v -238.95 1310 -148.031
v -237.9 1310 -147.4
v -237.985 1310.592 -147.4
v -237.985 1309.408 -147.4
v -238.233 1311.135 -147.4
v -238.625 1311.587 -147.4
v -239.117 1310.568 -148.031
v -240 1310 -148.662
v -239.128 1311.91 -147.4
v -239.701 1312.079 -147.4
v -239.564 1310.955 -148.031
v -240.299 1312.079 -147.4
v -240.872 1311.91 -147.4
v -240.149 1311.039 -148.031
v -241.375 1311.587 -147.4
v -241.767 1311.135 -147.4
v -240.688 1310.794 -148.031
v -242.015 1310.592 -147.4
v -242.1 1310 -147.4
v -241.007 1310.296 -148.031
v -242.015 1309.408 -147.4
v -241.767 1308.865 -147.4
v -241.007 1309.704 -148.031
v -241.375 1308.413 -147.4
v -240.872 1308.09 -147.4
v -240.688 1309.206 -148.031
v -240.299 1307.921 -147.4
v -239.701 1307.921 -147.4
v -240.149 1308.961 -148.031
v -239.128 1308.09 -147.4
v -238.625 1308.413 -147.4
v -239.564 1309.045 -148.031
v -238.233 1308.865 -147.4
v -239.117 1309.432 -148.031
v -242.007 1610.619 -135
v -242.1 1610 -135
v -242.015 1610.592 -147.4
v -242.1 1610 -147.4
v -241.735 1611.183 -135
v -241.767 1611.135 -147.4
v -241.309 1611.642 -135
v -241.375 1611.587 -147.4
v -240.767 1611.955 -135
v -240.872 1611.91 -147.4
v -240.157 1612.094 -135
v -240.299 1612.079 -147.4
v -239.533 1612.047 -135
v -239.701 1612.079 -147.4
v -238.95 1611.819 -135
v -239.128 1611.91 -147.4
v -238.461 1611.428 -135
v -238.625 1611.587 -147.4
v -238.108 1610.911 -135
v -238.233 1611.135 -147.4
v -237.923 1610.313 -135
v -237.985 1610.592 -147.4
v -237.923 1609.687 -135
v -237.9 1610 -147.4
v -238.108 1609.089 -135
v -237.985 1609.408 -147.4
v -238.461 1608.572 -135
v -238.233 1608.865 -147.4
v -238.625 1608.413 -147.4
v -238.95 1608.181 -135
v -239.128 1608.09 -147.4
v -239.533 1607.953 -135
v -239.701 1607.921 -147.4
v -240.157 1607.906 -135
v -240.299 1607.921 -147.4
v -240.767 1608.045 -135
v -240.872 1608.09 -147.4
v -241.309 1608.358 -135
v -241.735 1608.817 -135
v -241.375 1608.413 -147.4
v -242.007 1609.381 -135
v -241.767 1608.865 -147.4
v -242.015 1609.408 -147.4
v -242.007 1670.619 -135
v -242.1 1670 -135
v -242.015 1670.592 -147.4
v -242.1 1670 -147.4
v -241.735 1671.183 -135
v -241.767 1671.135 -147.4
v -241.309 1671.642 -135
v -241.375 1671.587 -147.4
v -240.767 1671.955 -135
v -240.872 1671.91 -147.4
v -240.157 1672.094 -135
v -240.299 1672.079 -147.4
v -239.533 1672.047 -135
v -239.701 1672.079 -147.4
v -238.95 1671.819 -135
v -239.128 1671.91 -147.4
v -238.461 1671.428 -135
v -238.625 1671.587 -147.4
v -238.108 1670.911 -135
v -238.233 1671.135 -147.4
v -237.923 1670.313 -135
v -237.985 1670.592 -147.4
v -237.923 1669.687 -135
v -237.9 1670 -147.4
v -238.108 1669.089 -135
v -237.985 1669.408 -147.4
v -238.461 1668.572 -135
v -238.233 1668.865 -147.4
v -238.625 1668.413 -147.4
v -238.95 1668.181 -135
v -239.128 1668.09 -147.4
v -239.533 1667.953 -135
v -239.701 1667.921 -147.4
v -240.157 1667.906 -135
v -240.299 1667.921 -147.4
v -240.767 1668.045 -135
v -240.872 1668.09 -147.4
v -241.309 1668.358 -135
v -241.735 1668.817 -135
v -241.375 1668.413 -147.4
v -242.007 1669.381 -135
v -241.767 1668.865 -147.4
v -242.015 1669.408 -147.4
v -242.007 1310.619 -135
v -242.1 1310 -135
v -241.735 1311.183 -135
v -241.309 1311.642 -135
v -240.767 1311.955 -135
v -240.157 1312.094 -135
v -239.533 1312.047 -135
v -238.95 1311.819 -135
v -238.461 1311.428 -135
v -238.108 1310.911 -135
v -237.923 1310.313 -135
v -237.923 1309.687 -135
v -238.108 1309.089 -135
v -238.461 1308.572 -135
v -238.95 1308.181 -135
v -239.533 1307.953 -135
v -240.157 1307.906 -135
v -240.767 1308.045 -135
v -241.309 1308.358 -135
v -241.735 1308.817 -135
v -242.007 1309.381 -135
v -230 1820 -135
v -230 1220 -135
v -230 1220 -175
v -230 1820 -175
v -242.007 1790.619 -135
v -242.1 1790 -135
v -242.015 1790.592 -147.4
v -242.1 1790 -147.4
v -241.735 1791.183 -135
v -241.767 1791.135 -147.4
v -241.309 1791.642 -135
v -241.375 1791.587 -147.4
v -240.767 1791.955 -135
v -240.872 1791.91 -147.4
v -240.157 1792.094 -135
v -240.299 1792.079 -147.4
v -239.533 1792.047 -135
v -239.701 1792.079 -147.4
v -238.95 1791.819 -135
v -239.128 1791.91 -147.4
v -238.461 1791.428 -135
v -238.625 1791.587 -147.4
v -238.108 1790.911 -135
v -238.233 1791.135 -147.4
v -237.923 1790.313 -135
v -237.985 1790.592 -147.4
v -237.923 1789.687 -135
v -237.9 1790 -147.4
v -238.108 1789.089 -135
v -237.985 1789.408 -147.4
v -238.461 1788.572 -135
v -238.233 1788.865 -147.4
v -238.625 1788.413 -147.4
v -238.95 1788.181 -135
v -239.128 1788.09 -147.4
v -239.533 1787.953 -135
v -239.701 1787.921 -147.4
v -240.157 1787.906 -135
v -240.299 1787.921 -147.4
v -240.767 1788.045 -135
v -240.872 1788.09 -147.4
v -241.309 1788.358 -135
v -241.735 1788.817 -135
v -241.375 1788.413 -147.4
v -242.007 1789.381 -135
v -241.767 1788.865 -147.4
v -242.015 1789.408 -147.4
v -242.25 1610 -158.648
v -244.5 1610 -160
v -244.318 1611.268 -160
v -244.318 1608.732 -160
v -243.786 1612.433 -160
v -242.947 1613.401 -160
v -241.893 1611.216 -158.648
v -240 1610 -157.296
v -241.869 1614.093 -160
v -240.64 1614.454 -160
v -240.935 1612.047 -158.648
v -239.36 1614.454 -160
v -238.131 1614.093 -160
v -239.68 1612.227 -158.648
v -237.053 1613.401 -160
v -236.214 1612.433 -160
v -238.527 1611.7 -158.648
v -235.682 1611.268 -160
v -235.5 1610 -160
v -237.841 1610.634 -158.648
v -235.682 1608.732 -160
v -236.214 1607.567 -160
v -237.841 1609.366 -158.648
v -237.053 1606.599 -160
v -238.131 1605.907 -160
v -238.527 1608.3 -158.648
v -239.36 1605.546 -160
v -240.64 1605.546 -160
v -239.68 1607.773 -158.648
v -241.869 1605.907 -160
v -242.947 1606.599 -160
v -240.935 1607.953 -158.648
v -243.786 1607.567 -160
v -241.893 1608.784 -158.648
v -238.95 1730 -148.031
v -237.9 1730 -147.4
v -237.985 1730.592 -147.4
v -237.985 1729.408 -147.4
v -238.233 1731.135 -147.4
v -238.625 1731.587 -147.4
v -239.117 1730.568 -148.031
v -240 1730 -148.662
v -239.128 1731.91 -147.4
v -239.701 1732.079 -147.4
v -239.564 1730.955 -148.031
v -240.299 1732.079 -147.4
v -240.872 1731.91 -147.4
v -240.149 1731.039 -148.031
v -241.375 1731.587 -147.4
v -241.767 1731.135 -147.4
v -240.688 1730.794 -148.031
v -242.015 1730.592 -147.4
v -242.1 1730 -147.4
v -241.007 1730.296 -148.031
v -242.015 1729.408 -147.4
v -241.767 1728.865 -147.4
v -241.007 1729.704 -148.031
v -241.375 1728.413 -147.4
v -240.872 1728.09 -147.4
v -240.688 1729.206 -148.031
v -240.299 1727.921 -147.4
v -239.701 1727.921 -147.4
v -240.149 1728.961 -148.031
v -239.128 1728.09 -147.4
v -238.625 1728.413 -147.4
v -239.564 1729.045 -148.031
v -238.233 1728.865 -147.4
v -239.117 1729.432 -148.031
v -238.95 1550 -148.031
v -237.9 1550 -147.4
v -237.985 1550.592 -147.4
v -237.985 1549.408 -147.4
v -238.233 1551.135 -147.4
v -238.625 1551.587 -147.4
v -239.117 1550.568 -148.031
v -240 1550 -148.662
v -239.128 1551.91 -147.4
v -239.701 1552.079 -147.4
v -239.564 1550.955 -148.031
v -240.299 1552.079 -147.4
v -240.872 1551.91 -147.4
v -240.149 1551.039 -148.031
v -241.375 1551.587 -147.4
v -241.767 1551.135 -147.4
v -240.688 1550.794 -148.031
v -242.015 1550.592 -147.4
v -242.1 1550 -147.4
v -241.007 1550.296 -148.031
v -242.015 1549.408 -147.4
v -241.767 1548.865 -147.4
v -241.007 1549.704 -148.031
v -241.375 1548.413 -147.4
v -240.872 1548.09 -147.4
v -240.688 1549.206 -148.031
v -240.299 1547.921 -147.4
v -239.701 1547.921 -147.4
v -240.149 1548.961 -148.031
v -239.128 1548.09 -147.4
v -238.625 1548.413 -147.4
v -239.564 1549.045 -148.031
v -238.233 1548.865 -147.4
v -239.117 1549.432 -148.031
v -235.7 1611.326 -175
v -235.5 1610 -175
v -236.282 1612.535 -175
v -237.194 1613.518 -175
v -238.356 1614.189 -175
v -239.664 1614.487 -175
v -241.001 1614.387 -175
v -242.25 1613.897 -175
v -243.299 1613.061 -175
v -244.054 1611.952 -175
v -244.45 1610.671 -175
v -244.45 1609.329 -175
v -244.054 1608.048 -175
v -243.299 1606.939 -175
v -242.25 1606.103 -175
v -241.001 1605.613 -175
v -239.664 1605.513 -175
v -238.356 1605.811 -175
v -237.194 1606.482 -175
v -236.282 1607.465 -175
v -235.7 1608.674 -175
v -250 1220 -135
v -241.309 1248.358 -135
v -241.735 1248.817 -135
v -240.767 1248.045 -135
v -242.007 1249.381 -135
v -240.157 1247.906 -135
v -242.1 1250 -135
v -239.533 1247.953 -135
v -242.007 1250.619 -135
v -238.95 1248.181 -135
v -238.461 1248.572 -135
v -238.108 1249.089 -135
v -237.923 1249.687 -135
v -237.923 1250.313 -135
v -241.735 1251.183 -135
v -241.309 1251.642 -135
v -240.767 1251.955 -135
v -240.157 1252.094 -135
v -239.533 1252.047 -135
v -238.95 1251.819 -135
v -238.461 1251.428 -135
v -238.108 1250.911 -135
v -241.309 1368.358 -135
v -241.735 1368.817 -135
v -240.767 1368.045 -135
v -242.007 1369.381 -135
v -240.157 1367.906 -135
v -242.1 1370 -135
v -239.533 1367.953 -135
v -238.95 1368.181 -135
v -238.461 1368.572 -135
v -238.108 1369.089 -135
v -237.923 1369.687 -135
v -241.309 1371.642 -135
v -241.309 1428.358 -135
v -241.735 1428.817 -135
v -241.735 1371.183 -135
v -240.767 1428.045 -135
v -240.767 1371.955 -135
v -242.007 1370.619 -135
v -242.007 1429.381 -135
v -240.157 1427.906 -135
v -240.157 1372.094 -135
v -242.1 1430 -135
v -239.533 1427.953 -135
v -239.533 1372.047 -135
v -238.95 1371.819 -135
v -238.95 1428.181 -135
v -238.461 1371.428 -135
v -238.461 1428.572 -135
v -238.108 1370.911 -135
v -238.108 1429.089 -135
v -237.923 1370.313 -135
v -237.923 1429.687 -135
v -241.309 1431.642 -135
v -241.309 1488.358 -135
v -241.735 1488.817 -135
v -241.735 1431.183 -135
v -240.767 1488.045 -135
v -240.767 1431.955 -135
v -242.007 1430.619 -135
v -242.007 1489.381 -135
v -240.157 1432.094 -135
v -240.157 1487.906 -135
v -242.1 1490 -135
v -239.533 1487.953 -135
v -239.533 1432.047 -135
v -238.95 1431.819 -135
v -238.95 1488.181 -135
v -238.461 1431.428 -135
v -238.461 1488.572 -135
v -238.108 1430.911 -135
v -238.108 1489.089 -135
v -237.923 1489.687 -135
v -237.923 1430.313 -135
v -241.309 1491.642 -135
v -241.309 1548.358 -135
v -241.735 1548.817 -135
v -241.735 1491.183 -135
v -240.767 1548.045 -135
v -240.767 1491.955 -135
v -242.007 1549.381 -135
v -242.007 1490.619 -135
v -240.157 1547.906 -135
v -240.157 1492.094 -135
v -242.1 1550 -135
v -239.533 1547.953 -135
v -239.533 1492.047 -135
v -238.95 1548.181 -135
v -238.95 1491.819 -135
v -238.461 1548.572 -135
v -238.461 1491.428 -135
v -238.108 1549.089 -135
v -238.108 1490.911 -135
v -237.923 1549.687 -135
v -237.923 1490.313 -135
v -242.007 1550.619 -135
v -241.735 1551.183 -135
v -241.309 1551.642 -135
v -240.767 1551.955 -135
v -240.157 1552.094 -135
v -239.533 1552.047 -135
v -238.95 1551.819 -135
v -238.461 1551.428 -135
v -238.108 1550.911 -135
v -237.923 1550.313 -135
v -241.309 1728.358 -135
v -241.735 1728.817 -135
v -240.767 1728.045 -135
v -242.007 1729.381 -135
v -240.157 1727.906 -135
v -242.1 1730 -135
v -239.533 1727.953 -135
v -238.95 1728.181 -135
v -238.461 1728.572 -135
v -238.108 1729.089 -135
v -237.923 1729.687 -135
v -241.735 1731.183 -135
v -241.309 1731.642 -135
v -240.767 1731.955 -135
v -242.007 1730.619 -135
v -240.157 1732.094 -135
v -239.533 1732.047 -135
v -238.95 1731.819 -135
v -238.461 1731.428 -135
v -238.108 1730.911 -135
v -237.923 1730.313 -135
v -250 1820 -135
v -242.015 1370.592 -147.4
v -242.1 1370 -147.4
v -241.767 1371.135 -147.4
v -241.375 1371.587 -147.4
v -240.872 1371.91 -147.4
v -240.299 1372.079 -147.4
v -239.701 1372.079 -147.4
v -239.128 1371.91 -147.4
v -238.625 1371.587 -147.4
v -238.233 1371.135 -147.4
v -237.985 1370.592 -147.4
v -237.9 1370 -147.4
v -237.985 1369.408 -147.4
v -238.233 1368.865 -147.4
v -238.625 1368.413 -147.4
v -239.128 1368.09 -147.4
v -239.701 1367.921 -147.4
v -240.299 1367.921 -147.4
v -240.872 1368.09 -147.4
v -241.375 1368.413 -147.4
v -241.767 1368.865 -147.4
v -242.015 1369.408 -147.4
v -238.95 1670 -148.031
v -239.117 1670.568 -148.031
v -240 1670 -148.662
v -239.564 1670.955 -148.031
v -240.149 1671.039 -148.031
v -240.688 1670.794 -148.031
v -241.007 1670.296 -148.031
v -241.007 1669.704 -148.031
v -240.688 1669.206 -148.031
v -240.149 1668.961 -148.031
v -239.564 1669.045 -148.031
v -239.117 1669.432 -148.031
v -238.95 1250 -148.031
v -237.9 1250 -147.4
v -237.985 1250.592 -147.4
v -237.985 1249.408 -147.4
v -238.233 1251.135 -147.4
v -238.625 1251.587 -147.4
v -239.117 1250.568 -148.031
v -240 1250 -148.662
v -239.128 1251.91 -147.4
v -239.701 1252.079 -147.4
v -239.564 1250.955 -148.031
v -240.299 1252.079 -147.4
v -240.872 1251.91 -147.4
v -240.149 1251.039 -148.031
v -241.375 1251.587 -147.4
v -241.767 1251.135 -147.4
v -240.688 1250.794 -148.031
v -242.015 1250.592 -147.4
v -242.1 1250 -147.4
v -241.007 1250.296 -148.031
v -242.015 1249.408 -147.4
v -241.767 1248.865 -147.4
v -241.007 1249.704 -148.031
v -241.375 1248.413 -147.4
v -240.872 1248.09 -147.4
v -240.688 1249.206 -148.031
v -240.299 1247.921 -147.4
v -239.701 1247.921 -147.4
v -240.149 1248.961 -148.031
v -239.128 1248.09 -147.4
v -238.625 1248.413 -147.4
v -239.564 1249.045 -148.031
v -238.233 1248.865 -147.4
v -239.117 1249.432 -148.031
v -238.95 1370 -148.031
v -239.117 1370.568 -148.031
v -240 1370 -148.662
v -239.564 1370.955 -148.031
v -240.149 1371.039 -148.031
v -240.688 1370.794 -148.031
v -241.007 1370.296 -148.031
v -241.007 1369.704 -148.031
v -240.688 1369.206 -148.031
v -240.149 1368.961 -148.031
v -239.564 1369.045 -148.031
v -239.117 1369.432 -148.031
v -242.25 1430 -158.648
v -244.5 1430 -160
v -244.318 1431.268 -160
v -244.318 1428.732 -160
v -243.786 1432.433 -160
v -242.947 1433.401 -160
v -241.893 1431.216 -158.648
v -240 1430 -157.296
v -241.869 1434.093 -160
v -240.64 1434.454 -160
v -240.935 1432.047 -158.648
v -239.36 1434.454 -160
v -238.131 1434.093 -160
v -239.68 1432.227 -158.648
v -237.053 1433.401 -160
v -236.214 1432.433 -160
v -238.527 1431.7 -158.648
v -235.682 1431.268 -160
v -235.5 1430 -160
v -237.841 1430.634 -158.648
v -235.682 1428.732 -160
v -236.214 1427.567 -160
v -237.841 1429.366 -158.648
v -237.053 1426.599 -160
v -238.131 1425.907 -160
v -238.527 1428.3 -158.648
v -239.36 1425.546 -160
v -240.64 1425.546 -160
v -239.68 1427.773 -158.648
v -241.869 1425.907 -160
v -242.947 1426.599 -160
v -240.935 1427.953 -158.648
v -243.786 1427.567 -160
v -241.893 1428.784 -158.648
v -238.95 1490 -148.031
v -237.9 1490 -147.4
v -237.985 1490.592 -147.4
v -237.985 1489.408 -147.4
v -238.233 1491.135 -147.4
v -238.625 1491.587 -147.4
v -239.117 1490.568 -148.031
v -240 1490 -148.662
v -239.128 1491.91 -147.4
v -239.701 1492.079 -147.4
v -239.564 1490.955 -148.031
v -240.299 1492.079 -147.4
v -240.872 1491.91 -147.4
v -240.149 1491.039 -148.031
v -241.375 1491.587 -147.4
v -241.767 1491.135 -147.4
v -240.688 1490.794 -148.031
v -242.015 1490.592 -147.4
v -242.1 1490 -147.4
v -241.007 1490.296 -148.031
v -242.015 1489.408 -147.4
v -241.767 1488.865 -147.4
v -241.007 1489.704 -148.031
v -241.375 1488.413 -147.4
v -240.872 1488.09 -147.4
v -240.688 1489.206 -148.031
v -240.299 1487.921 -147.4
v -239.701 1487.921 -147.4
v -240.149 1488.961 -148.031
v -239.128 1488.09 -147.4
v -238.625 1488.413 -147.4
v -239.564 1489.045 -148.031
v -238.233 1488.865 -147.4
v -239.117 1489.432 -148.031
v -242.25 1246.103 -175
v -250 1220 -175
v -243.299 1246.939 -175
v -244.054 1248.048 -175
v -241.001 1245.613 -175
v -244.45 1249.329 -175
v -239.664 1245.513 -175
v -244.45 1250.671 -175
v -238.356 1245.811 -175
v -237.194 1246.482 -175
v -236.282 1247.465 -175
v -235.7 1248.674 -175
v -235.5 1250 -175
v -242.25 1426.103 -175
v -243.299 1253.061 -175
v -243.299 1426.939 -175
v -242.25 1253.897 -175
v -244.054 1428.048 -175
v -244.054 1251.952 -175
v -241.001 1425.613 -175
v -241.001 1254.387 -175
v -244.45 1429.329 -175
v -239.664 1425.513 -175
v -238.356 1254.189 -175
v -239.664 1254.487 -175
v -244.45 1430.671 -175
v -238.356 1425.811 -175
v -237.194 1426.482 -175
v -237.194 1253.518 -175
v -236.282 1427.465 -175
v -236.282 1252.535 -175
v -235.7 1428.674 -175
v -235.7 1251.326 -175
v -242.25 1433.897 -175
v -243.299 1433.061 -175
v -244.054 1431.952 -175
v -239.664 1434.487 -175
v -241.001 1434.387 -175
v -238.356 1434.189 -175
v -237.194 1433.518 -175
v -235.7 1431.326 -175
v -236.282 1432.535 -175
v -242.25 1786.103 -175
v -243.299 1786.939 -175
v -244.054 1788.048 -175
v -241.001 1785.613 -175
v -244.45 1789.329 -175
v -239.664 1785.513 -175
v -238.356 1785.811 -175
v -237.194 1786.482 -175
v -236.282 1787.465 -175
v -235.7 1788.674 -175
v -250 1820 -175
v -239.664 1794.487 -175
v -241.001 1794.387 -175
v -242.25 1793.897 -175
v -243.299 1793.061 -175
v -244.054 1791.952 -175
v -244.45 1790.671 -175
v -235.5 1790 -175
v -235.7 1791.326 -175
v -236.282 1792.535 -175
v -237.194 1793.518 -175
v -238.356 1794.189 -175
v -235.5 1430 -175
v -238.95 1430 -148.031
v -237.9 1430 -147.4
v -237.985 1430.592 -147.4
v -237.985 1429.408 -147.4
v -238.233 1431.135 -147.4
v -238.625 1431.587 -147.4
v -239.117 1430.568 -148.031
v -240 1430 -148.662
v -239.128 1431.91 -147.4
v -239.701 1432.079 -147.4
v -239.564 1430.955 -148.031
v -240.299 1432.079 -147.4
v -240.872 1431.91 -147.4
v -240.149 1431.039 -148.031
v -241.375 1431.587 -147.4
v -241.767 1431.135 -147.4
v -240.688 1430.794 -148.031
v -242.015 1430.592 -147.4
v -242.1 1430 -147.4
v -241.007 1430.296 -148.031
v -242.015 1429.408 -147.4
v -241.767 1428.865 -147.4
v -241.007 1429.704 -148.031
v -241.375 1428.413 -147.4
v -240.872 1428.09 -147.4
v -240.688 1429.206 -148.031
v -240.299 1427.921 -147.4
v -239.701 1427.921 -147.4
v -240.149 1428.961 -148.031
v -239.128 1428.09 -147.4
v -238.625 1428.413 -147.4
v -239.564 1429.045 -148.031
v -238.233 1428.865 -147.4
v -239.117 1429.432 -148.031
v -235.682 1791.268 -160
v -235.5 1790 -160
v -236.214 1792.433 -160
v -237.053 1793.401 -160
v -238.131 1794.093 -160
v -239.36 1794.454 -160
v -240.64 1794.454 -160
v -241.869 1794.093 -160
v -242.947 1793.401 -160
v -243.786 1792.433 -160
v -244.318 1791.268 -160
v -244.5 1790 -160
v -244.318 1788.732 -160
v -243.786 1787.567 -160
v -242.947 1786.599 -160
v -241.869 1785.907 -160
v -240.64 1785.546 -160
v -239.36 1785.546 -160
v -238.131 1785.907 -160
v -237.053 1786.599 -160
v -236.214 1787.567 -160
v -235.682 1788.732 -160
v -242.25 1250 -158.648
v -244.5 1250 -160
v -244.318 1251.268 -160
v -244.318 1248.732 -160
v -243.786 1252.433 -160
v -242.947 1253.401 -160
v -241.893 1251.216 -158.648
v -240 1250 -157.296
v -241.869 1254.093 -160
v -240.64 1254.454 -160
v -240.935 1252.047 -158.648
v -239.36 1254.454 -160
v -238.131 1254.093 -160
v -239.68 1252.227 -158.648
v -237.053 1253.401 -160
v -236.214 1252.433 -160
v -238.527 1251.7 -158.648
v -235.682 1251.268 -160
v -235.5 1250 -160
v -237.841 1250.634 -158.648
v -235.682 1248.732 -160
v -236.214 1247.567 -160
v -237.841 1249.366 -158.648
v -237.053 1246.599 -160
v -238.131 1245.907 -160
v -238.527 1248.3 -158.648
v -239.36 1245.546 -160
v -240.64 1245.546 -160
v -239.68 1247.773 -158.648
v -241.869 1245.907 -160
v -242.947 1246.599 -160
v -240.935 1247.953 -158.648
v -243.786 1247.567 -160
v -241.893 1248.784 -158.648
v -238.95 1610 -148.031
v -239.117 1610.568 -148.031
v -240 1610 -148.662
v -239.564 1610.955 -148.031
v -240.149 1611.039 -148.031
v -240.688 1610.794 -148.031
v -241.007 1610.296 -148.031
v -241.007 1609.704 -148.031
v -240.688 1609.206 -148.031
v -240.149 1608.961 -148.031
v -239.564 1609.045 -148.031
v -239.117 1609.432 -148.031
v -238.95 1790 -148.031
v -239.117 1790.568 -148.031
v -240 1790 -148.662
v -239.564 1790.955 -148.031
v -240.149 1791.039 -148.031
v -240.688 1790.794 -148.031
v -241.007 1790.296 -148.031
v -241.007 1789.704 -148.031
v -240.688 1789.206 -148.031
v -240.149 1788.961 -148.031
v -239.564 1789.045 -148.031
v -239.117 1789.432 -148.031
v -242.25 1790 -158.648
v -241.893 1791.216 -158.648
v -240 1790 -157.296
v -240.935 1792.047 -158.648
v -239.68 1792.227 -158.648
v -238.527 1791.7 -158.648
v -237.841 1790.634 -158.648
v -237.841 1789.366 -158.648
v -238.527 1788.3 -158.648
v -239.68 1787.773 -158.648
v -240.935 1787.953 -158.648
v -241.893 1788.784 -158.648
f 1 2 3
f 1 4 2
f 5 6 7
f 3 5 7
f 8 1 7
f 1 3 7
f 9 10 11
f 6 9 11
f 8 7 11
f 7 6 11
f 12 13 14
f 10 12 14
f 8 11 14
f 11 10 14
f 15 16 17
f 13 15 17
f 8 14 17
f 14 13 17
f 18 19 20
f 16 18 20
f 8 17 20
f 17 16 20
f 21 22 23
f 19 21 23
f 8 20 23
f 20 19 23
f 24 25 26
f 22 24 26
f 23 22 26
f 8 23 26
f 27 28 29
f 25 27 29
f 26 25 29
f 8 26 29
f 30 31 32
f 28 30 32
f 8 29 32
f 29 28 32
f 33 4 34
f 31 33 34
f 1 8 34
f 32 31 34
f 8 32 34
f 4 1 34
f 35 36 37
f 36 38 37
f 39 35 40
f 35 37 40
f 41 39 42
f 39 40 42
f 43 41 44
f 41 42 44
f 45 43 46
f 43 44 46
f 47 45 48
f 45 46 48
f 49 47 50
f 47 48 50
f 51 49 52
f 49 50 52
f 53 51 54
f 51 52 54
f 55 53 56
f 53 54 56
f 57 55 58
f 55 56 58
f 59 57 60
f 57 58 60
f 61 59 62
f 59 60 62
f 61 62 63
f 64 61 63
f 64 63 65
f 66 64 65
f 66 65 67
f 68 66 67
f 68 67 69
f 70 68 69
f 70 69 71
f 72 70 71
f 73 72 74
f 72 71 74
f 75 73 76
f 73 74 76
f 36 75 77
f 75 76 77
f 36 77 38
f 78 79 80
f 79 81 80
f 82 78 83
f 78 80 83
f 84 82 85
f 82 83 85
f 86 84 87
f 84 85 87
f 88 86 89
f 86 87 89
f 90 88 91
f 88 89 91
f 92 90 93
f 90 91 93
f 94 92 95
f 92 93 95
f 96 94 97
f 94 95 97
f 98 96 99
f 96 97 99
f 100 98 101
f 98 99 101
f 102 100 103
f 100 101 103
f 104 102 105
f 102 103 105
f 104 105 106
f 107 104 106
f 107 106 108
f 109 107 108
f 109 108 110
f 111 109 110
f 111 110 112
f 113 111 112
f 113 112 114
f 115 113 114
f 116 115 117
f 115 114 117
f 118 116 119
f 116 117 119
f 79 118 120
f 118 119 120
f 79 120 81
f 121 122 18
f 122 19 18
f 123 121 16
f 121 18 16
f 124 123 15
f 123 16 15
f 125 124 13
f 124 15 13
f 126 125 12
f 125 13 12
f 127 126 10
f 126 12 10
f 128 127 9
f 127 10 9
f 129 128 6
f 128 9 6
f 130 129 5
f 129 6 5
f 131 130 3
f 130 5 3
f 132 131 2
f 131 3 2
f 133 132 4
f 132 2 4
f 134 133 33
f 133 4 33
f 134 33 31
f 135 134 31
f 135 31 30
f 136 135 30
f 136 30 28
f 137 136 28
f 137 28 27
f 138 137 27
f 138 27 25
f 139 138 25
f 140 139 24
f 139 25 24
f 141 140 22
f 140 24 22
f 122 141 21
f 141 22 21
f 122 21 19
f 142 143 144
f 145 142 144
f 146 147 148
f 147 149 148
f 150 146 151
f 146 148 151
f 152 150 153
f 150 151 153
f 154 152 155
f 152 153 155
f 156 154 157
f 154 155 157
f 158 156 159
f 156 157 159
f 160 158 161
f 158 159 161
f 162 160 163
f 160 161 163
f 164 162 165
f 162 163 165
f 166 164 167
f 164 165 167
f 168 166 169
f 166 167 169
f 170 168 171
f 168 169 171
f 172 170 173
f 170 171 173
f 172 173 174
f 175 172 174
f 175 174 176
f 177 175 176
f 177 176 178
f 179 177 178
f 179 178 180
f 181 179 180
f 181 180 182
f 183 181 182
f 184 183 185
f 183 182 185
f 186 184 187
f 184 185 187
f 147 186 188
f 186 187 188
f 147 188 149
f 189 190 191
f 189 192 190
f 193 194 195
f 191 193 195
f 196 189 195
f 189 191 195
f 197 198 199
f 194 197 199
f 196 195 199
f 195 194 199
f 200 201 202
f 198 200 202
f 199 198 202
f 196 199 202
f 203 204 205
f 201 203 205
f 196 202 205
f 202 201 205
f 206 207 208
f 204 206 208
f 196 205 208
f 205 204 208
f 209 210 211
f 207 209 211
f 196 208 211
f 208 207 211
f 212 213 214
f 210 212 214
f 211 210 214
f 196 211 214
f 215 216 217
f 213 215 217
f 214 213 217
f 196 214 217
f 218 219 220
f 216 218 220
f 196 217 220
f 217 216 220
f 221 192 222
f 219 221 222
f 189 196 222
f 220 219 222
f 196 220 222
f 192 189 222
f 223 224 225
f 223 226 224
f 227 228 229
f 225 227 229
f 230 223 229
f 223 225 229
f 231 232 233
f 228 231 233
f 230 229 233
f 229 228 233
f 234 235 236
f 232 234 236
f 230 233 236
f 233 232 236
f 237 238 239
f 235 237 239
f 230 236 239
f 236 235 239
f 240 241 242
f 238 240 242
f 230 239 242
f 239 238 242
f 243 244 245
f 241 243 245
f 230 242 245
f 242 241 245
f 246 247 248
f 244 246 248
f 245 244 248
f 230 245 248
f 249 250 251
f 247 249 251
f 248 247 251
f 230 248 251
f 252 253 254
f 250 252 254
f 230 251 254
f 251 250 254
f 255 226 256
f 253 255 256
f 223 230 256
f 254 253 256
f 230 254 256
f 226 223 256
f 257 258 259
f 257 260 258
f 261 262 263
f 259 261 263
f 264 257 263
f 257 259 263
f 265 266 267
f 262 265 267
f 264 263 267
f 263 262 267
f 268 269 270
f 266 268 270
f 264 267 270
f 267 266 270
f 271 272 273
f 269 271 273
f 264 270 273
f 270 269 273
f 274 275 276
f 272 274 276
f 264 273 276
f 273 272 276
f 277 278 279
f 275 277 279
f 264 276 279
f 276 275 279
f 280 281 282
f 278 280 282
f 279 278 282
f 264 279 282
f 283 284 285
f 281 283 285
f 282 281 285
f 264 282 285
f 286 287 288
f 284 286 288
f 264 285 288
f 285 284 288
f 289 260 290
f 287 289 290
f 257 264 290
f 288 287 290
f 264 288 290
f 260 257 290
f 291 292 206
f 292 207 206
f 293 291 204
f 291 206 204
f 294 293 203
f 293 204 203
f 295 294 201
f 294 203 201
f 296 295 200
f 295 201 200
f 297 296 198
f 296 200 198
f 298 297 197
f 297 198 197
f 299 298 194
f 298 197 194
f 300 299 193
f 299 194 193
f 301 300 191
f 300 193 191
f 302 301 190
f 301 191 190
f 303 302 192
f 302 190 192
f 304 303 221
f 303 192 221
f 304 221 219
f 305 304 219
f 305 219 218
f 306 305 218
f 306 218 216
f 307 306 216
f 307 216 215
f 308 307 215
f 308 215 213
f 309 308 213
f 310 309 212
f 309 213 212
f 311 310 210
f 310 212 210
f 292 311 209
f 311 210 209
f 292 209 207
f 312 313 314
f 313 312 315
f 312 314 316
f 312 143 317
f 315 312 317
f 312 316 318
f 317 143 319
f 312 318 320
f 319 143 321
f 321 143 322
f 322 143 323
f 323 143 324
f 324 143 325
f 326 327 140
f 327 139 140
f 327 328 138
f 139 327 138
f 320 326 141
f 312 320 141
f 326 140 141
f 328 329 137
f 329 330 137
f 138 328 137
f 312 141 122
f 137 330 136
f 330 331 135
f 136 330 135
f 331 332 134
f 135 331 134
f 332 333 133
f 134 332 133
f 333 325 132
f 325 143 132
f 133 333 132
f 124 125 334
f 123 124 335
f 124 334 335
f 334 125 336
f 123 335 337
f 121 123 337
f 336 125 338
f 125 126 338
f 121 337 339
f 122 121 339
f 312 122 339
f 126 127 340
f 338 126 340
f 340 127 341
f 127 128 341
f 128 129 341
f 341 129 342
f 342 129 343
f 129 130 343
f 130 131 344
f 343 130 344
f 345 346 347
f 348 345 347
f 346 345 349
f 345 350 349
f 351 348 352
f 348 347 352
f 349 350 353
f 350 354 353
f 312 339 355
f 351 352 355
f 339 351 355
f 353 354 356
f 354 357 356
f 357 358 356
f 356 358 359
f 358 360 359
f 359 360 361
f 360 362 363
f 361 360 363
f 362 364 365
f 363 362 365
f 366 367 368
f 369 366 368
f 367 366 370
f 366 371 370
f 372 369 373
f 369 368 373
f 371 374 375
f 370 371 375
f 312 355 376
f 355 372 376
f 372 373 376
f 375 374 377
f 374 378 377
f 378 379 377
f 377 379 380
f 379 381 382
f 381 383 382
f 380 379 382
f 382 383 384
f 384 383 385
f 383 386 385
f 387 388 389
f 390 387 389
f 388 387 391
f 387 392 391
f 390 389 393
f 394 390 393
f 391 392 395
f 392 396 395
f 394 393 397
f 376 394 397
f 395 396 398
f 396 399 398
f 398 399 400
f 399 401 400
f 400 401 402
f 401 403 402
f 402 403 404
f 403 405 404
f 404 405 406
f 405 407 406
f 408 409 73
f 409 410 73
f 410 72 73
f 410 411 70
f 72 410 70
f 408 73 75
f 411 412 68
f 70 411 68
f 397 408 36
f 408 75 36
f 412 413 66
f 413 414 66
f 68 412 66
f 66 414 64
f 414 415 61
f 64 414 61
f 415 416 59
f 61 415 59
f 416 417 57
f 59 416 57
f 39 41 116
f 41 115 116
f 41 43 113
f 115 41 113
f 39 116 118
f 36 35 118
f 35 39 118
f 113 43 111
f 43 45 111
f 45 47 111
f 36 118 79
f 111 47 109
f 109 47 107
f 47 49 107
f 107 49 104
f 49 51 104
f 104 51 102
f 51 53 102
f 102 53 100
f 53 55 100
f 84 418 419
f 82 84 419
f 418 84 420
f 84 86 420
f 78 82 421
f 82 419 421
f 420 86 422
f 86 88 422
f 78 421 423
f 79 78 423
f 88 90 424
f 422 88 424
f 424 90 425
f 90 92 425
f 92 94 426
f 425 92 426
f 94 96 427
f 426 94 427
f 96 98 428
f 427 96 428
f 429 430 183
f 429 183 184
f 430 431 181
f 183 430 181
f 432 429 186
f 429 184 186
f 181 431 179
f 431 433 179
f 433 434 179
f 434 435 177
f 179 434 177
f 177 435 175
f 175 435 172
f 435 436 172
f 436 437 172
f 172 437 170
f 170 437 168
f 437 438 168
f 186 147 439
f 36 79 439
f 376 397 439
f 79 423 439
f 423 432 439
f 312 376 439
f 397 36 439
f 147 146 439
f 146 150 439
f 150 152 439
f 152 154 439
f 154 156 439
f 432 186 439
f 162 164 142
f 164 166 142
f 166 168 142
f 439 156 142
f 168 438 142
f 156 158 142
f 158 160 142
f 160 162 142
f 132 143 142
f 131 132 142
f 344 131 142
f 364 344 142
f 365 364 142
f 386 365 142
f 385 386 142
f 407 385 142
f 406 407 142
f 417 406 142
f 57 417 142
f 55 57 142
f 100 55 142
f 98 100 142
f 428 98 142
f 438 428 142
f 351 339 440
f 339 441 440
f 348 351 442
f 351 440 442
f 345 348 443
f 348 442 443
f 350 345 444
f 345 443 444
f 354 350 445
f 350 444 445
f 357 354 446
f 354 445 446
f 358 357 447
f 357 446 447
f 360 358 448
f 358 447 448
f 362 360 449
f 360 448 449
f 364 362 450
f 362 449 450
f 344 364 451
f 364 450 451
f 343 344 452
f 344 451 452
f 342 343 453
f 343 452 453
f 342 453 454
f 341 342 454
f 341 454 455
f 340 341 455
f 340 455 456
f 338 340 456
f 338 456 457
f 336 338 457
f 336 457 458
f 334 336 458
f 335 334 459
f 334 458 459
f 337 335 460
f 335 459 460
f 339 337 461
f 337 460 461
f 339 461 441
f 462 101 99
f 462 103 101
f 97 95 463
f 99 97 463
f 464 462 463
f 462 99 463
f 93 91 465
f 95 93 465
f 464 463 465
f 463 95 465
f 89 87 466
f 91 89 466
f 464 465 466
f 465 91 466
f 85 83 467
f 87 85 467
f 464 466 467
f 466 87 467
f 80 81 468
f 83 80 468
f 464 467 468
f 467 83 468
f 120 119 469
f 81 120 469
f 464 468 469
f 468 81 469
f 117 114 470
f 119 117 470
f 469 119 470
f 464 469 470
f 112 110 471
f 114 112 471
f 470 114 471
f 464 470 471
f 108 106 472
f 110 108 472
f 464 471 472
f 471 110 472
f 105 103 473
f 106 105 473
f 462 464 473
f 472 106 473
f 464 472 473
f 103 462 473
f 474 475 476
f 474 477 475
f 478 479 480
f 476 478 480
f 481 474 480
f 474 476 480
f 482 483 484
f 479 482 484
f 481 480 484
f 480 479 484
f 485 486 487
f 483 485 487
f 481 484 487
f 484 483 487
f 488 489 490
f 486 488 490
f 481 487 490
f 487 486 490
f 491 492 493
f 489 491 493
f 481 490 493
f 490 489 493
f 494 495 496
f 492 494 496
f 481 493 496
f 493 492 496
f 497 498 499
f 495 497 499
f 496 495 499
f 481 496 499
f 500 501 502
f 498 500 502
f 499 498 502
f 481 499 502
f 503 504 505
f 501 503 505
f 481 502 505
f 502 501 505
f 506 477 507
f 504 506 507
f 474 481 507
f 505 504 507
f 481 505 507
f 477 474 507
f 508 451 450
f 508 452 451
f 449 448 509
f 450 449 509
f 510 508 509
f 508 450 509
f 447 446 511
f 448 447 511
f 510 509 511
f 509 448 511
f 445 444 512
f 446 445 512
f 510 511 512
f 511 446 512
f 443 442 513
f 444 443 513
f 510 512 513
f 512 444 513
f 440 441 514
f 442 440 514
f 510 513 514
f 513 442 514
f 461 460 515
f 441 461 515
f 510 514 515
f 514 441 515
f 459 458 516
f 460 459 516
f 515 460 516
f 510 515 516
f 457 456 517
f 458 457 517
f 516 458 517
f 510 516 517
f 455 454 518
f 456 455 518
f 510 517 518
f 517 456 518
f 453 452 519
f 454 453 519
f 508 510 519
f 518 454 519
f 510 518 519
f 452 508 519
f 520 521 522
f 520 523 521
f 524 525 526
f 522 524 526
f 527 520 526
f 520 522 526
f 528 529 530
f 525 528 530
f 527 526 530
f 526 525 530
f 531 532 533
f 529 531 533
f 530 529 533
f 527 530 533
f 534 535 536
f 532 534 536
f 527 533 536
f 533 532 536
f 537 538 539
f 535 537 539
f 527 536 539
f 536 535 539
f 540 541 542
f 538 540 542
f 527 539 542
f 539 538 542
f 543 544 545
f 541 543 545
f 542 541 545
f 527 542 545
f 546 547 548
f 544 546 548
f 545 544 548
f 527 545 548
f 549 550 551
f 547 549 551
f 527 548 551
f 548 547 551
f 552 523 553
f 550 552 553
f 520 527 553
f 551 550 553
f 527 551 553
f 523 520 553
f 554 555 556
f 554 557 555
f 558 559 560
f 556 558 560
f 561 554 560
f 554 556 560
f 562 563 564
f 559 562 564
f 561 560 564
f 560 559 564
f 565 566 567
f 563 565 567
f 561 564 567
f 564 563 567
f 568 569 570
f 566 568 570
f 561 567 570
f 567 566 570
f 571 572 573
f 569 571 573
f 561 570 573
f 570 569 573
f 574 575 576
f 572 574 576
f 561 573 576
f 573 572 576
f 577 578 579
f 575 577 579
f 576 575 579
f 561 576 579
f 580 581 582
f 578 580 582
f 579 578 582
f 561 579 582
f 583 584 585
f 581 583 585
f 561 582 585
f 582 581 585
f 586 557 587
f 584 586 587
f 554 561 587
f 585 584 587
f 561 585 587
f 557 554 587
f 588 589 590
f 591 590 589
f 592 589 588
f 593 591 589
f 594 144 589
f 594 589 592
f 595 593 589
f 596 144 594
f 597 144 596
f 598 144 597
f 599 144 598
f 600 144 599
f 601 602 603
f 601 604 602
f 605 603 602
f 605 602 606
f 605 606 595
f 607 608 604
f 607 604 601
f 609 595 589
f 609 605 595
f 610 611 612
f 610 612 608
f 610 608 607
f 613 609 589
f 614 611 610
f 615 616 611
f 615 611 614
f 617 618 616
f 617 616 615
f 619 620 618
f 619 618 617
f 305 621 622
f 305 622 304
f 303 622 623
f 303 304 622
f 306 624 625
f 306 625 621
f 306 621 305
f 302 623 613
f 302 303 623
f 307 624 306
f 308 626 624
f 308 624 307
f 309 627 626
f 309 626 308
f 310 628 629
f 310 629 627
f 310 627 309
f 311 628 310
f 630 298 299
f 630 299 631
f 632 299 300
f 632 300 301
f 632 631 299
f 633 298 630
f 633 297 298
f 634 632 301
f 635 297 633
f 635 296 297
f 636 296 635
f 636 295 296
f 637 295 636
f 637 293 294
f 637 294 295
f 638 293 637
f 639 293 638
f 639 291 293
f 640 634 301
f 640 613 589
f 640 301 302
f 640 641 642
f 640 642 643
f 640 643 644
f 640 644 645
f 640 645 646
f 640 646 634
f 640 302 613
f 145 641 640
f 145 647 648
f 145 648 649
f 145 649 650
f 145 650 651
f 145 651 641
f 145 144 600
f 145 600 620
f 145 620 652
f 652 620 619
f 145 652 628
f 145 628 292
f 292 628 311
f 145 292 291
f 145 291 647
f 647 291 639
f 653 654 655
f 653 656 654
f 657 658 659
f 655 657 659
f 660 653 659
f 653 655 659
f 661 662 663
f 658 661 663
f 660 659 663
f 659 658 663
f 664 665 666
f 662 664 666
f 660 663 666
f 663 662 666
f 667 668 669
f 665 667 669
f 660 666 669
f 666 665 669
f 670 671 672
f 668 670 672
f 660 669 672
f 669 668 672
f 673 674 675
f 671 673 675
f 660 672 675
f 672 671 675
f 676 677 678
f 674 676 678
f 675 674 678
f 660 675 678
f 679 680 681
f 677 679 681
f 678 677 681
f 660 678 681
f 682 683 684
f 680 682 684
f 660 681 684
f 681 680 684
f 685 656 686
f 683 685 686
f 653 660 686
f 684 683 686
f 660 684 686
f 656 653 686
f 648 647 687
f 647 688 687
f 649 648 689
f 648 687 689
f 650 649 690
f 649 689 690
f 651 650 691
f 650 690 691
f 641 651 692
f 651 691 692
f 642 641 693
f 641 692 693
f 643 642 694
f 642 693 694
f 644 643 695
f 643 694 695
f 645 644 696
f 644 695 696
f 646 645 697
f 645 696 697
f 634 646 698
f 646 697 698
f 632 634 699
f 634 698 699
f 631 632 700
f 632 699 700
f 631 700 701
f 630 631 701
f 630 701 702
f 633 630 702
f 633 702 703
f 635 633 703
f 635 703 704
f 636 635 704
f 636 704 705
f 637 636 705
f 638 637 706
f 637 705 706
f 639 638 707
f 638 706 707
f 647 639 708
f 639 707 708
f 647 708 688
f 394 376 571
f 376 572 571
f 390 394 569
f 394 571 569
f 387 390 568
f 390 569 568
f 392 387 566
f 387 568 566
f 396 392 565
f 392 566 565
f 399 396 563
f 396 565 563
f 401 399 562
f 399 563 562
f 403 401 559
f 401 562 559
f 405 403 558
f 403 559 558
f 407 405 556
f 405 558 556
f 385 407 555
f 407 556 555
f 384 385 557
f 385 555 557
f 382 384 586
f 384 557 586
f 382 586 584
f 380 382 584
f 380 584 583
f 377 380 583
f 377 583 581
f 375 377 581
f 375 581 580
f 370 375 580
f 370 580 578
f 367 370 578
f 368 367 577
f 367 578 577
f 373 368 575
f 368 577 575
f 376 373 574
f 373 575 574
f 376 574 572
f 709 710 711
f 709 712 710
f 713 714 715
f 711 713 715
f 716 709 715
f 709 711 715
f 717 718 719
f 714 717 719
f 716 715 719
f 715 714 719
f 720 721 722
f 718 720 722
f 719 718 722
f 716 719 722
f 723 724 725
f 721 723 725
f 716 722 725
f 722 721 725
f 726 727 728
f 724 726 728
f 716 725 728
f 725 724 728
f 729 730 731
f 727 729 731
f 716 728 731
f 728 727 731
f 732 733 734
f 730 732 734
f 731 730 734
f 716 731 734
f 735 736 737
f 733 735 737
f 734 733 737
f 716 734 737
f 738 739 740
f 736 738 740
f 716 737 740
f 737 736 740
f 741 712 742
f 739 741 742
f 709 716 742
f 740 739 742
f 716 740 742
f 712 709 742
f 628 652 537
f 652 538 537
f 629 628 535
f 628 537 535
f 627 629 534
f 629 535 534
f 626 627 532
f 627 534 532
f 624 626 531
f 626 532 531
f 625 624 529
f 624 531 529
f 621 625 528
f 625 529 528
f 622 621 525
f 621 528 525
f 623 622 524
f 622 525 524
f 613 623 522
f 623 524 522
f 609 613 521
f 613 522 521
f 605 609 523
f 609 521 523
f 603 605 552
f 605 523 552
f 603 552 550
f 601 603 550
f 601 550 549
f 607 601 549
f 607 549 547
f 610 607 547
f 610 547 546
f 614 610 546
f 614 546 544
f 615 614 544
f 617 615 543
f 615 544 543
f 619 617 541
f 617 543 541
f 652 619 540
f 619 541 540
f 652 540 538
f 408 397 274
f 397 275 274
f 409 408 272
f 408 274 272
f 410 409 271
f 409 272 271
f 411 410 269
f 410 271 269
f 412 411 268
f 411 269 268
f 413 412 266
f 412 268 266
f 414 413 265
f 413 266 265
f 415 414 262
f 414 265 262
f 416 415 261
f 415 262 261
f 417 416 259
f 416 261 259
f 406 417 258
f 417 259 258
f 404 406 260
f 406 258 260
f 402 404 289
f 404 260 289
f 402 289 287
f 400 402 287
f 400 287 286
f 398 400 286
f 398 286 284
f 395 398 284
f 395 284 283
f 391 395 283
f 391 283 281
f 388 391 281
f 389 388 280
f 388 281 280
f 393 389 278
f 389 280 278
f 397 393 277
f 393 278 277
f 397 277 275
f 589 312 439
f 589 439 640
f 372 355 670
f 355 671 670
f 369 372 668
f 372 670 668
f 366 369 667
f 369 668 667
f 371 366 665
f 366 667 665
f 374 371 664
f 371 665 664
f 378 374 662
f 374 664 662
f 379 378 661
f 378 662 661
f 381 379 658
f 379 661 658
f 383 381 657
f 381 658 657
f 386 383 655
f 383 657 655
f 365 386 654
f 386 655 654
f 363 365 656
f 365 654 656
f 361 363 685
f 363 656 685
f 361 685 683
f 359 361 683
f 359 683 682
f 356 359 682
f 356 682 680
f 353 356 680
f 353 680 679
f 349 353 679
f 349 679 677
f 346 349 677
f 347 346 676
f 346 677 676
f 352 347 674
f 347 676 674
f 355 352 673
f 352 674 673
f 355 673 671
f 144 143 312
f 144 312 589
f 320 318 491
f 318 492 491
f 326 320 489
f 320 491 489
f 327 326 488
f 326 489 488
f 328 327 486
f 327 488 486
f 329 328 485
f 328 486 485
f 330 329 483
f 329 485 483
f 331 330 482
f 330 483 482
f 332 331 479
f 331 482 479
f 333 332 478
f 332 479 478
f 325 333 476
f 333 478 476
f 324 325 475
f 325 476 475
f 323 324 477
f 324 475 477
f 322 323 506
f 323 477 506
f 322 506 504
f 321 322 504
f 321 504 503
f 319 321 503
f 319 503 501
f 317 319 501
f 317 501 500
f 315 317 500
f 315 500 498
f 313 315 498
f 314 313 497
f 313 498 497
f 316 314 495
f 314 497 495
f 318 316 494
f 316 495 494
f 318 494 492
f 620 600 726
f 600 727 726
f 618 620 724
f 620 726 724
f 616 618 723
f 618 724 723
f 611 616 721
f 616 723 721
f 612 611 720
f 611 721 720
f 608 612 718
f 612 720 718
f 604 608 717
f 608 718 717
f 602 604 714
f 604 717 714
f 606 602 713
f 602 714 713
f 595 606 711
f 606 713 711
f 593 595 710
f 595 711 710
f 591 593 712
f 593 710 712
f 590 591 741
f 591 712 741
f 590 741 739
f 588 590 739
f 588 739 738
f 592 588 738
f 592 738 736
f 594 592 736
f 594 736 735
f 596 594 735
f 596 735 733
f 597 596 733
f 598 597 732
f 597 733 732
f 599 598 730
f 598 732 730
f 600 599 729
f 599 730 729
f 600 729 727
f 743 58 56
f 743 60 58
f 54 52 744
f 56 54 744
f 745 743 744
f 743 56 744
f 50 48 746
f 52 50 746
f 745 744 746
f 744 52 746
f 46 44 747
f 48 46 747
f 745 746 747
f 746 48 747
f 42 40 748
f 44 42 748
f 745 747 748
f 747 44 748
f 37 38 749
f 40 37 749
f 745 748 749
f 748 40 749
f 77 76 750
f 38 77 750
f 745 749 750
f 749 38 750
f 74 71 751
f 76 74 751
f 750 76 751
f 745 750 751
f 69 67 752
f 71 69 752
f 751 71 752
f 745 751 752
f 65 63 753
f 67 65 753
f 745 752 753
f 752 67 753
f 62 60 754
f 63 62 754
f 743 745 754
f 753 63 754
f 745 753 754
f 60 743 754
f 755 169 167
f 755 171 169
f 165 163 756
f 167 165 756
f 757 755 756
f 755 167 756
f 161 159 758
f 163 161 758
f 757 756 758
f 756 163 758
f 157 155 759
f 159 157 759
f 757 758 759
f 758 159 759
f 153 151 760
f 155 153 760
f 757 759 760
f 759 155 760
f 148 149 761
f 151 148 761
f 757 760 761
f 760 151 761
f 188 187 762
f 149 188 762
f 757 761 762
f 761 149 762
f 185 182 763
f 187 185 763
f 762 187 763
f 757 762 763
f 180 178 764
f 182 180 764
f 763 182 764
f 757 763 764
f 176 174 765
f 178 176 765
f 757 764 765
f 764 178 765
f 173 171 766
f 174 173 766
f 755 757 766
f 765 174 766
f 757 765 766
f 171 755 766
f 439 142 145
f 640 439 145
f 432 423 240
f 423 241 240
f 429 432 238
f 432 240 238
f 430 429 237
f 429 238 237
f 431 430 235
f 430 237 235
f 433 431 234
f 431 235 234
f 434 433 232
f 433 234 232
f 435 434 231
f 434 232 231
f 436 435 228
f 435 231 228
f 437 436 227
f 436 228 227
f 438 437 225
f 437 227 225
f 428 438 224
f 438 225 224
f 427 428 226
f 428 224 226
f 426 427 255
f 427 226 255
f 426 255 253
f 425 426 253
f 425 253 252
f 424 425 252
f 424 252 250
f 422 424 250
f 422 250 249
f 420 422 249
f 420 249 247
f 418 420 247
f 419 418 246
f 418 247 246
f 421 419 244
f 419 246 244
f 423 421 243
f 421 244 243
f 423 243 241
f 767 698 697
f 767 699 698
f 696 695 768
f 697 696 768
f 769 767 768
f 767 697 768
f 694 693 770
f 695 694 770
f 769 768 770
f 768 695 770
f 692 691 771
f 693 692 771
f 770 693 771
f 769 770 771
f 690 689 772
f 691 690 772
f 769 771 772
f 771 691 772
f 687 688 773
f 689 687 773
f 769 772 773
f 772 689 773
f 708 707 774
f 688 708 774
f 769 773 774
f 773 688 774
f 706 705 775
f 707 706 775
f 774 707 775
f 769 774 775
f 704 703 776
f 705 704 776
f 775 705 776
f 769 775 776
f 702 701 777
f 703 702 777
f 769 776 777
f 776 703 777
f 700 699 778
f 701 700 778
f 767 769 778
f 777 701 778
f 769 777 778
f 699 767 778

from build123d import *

# Parameters (mm, degrees)
SKETCH_1_W                  = 40
SKETCH_1_H                  = 600
EXTRUDE_1_DEPTH             = 20
HOLE_WIZARD_9_0_9_1_D       = 9
HOLE_WIZARD_9_0_9_1_DEPTH   = 15
HOLE_WIZARD_9_0_9_1_TIP     = 2.703872786
HOLE_WIZARD_4_2_4_2_1_D     = 4.2
HOLE_WIZARD_4_2_4_2_1_DEPTH = 12.4
HOLE_WIZARD_4_2_4_2_1_TIP   = 1.2618073


with BuildPart() as part:
    # 草图1 → 凸台-拉伸1 (new body)
    with BuildSketch(Plane(origin=(-230, 0, 0), x_dir=(0, 0, -1), z_dir=(1, 0, 0))):
        with Locations((155, 1520)):
            Rectangle(SKETCH_1_W, SKETCH_1_H)
    extrude(amount=-EXTRUDE_1_DEPTH)

    # Ø9.0 (9) 直径孔1
    with Locations(Plane(origin=(0, 0, -175), x_dir=(-1, 0, 0), z_dir=(0, 0, -1))):
        with Locations((240, 1250), (240, 1430), (240, 1610), (240, 1790)):
            Hole(HOLE_WIZARD_9_0_9_1_D / 2, depth=HOLE_WIZARD_9_0_9_1_DEPTH)
            with Locations((0, 0, -(HOLE_WIZARD_9_0_9_1_DEPTH + HOLE_WIZARD_9_0_9_1_TIP / 2))):  # 118° drill point
                Cone(0, HOLE_WIZARD_9_0_9_1_D / 2, HOLE_WIZARD_9_0_9_1_TIP, mode=Mode.SUBTRACT)

    # Ø4.2 (4.2) 直径孔1
    with Locations(Plane.XY.offset(-135)):
        with Locations((-240, 1610), (-240, 1250), (-240, 1310), (-240, 1370), (-240, 1430), (-240, 1490), (-240, 1550), (-240, 1670), (-240, 1730), (-240, 1790)):
            Hole(HOLE_WIZARD_4_2_4_2_1_D / 2, depth=HOLE_WIZARD_4_2_4_2_1_DEPTH)
            with Locations((0, 0, -(HOLE_WIZARD_4_2_4_2_1_DEPTH + HOLE_WIZARD_4_2_4_2_1_TIP / 2))):  # 118° drill point
                Cone(0, HOLE_WIZARD_4_2_4_2_1_D / 2, HOLE_WIZARD_4_2_4_2_1_TIP, mode=Mode.SUBTRACT)


solid = part.part
